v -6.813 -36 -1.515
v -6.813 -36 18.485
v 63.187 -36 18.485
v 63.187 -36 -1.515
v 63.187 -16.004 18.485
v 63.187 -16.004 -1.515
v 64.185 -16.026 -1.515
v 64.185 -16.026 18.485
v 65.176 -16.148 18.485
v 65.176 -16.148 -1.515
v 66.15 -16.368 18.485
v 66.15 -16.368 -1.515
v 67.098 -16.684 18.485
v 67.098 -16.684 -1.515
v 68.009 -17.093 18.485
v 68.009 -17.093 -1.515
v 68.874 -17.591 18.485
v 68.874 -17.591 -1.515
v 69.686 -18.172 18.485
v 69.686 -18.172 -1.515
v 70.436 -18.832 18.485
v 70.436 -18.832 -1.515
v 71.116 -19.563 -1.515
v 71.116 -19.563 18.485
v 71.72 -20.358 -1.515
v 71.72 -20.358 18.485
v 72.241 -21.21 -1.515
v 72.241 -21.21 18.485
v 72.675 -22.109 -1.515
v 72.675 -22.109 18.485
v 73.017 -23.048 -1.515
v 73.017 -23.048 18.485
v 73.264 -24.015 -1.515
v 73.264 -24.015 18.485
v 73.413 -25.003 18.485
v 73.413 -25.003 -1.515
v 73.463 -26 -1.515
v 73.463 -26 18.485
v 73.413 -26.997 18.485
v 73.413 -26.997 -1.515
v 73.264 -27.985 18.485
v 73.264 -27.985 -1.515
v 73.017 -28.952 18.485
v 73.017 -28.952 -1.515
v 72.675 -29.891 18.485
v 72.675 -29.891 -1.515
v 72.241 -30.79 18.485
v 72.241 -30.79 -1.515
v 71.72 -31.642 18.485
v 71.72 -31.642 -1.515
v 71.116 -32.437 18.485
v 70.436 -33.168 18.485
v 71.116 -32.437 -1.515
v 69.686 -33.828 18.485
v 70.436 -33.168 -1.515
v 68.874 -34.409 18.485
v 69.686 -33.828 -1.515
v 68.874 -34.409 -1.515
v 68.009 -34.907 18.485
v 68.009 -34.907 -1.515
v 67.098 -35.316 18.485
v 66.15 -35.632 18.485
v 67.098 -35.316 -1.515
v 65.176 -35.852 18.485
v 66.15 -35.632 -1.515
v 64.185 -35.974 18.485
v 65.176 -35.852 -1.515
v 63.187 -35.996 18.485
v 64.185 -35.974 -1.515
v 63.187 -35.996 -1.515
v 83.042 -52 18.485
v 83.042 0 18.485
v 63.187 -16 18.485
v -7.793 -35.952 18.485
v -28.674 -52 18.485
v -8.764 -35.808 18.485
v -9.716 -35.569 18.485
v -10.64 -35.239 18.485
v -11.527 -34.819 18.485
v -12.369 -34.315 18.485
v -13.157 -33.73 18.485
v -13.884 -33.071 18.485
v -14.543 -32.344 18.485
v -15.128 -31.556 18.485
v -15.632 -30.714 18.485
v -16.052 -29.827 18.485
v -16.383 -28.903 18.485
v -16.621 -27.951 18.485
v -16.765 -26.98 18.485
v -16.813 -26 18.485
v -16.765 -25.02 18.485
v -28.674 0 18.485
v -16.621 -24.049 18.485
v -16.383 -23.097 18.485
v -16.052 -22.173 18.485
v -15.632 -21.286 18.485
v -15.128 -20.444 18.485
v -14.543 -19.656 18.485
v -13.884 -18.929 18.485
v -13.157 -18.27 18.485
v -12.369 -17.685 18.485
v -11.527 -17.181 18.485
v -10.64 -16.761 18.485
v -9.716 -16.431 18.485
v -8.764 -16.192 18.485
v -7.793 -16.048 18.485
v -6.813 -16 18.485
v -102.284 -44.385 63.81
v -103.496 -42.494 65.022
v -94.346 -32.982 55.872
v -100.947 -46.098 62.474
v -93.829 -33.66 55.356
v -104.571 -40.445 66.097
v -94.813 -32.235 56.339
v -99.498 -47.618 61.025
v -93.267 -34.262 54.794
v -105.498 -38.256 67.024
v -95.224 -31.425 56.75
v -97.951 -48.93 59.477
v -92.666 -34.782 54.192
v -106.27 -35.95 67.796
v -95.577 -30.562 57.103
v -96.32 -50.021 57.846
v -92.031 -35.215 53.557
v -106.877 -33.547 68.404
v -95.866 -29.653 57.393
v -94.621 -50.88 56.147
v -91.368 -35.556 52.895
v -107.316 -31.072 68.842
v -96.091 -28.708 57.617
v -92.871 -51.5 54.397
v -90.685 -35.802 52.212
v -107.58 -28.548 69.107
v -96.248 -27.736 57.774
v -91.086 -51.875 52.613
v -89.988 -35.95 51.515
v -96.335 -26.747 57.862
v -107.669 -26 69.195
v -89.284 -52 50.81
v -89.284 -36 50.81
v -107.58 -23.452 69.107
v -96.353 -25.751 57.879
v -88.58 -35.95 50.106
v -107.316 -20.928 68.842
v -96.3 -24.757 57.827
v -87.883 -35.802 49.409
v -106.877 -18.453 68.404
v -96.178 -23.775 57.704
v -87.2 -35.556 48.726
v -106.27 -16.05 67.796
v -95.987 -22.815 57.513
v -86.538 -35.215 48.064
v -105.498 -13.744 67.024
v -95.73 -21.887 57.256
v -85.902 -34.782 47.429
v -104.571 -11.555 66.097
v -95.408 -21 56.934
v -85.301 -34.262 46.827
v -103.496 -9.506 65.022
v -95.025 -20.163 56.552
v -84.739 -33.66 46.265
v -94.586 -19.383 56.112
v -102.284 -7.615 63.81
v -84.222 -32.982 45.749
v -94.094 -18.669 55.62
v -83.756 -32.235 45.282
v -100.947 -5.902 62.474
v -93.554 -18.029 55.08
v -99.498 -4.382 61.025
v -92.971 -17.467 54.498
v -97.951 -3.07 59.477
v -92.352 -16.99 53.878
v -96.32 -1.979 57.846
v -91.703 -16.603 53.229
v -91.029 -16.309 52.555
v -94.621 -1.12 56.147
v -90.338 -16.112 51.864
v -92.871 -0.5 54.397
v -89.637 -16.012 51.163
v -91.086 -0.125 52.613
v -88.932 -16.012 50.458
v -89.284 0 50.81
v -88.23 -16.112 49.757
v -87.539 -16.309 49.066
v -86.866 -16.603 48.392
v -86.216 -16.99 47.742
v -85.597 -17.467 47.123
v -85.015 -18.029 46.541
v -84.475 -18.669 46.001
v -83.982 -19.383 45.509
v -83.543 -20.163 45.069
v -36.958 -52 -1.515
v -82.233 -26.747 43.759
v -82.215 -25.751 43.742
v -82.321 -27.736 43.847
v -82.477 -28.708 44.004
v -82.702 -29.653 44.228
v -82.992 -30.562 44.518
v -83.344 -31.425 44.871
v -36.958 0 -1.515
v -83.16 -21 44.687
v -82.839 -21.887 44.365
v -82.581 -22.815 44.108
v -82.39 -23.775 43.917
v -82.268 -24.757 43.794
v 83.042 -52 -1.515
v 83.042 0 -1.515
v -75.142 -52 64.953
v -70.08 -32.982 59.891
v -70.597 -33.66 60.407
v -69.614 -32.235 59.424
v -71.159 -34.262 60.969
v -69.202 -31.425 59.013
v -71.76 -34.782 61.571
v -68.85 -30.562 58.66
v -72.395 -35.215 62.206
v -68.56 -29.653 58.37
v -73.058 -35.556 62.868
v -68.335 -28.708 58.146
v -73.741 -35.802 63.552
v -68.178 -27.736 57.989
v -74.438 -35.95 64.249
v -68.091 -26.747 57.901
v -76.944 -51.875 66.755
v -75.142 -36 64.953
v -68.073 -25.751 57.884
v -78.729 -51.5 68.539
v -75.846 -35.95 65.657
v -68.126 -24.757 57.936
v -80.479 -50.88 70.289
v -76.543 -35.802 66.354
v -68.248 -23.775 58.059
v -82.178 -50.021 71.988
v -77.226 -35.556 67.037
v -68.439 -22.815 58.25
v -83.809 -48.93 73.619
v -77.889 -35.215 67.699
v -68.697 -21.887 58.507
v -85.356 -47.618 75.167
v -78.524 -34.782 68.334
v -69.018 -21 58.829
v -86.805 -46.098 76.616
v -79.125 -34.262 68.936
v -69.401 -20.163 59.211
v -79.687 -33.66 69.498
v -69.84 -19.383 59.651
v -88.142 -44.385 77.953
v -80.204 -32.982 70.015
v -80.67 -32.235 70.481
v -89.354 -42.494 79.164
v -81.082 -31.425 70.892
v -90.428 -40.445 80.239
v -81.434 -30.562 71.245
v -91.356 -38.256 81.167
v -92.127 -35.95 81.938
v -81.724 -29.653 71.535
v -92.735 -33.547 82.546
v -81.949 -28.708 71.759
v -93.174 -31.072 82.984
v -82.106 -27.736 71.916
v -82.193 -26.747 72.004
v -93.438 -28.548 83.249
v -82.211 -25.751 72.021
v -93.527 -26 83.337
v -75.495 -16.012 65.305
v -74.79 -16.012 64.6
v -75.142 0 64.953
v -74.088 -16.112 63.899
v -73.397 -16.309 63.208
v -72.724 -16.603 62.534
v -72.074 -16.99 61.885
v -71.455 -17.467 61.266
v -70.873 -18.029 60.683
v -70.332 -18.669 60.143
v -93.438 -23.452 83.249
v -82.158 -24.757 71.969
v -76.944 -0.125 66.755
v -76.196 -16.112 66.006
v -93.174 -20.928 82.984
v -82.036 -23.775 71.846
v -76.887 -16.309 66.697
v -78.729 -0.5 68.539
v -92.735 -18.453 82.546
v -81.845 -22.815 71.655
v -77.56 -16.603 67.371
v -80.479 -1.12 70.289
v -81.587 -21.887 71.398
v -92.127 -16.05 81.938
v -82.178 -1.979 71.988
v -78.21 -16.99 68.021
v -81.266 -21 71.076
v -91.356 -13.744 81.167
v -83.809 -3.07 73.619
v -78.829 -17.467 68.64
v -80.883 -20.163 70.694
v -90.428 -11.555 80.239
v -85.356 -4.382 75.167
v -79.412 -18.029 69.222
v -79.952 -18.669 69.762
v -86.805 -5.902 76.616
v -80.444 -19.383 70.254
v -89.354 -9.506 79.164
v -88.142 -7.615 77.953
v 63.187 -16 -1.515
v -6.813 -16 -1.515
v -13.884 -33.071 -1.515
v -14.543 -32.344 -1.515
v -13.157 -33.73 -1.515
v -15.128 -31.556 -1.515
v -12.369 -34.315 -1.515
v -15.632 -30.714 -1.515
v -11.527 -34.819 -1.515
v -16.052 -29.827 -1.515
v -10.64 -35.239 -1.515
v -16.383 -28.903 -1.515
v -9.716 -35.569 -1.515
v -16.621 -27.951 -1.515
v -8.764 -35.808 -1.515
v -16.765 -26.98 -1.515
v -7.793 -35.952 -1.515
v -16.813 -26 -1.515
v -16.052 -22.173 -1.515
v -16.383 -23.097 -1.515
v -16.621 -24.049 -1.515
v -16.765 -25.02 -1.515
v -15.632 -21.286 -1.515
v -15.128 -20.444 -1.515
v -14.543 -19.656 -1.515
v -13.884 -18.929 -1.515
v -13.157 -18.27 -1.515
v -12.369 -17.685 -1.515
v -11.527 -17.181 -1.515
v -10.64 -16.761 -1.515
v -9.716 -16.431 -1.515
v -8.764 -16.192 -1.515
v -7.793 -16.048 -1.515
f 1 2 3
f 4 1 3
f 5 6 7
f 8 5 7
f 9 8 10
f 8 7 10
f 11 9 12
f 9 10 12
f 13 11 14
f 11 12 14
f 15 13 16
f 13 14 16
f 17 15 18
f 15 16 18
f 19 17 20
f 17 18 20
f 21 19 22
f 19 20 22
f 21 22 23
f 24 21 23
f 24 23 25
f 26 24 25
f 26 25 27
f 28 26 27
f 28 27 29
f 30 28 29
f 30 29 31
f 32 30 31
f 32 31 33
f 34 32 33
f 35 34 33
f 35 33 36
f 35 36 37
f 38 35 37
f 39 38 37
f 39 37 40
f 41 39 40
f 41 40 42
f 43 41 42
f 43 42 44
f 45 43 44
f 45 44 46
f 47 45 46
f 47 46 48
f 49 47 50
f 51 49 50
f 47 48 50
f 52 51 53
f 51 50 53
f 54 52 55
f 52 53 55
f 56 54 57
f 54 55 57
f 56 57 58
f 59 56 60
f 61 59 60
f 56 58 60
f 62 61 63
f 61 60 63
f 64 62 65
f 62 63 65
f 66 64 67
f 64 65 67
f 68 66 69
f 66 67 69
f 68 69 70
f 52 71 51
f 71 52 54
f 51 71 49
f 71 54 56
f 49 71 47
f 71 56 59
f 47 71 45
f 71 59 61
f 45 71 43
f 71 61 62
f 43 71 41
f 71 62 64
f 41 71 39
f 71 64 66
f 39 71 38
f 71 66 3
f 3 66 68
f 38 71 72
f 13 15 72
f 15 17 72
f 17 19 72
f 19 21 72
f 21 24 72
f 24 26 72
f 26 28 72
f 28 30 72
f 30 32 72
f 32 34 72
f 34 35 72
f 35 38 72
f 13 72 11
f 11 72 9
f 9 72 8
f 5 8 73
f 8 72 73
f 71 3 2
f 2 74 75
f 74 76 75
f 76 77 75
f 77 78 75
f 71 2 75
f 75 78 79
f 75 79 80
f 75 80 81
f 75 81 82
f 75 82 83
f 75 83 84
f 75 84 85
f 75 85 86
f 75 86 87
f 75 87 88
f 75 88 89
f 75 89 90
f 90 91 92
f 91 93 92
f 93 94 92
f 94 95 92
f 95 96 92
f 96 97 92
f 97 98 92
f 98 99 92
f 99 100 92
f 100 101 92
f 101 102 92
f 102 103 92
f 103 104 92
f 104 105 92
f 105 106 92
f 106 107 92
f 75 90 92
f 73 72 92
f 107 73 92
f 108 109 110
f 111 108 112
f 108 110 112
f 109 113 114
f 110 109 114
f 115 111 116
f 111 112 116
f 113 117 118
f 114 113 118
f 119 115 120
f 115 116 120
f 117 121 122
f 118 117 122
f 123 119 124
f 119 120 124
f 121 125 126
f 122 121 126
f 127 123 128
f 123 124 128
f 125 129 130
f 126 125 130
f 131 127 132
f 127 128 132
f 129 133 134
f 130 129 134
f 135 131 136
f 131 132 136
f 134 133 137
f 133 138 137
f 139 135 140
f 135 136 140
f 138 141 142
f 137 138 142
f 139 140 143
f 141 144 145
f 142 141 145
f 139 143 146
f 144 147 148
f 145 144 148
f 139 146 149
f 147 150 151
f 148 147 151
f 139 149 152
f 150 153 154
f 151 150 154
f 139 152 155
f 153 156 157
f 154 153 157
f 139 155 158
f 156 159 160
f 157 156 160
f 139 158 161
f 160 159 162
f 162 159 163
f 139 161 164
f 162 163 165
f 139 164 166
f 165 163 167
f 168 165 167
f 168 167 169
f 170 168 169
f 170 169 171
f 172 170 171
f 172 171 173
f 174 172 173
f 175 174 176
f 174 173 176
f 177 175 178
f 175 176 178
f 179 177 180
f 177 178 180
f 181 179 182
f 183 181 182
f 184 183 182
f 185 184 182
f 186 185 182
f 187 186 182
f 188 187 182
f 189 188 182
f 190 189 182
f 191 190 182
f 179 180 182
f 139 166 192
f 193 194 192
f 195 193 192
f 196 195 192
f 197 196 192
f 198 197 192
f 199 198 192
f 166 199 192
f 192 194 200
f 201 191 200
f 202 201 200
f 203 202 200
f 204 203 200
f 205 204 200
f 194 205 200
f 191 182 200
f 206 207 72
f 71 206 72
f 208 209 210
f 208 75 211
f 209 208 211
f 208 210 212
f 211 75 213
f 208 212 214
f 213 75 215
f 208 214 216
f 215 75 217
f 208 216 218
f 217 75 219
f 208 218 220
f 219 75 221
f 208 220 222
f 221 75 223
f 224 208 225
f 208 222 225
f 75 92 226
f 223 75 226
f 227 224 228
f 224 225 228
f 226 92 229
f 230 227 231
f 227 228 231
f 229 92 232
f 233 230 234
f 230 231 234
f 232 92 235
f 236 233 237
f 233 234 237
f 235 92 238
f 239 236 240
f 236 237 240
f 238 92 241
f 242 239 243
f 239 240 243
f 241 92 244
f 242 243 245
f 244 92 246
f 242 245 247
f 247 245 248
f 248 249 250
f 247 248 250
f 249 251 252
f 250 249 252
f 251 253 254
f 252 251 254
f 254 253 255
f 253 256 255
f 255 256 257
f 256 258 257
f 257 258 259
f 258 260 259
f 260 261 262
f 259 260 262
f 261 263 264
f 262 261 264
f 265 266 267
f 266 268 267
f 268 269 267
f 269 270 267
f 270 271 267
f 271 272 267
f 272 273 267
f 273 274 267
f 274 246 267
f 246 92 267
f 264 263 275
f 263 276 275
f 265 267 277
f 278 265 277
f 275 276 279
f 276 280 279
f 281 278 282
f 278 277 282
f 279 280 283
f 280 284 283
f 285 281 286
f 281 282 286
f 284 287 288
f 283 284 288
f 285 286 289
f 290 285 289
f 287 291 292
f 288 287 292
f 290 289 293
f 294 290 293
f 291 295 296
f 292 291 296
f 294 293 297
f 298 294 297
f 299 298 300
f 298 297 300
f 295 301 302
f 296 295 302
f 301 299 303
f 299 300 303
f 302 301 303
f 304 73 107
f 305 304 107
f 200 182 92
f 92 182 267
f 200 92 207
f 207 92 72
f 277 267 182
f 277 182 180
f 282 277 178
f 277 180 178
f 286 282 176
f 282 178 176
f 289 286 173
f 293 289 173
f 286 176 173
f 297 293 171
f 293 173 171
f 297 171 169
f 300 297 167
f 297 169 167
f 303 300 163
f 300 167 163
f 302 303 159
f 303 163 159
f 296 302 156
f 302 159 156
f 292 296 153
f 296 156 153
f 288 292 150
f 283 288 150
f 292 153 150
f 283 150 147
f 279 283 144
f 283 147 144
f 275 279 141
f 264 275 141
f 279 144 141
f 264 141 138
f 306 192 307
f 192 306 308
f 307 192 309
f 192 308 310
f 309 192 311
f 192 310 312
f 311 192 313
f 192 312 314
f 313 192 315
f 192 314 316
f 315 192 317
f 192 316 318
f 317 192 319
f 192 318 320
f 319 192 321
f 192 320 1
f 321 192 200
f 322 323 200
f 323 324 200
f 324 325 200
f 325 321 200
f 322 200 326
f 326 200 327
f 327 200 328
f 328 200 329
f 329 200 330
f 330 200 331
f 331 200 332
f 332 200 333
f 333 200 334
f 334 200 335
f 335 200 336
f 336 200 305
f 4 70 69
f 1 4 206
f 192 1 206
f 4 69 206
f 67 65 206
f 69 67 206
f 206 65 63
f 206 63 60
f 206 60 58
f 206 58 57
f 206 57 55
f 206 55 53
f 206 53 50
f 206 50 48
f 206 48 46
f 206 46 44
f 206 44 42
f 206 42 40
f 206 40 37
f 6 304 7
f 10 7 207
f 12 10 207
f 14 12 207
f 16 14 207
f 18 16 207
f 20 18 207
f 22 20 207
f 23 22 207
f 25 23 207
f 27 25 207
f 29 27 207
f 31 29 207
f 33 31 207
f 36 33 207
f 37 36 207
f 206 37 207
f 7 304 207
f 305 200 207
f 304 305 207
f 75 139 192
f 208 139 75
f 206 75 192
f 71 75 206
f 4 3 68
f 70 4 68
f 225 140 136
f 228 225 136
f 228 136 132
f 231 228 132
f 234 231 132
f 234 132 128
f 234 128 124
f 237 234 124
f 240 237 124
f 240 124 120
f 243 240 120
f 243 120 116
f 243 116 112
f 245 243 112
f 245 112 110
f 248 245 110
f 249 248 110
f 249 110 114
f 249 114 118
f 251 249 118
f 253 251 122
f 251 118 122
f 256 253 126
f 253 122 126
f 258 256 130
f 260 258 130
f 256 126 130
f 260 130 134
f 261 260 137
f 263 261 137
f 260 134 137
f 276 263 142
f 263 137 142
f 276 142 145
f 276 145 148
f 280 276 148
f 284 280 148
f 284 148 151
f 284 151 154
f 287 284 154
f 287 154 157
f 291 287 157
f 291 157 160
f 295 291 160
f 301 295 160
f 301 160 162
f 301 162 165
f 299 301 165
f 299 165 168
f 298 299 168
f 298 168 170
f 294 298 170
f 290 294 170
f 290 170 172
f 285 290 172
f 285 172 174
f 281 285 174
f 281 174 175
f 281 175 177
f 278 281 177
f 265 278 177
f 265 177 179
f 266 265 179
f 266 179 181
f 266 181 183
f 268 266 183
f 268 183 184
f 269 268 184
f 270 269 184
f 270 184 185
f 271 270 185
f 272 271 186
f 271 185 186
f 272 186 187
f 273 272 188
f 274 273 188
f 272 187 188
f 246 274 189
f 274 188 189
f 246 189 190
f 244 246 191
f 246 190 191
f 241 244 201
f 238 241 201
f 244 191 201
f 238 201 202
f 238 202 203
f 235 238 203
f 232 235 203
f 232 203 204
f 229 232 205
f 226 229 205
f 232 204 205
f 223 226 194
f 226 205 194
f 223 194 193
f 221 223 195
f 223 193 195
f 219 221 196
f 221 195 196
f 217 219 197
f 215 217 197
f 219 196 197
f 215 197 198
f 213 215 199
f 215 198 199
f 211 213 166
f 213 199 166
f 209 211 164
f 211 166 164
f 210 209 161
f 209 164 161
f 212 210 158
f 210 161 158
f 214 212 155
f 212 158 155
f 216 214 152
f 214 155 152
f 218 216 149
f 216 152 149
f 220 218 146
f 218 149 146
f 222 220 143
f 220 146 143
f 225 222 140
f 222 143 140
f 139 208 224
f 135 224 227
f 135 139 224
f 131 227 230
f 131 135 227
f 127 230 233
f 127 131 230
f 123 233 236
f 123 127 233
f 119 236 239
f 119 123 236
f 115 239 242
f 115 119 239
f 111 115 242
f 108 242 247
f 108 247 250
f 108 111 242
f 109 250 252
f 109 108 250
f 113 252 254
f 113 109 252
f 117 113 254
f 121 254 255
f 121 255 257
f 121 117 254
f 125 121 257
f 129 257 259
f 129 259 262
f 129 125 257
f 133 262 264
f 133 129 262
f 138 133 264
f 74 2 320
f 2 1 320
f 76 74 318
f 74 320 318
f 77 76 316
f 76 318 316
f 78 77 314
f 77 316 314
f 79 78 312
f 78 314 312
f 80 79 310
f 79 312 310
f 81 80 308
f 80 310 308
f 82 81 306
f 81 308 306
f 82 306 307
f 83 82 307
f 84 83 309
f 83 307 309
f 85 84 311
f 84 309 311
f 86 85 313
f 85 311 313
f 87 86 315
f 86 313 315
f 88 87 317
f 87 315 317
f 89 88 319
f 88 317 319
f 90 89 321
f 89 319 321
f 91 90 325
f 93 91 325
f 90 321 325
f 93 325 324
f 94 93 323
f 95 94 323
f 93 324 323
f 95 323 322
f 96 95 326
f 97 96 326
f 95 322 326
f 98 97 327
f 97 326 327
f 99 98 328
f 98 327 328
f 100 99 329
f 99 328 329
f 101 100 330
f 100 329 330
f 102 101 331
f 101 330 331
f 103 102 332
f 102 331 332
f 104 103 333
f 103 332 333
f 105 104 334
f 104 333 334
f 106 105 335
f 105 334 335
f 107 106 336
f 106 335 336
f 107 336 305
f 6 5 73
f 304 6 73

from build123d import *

# Parameters (mm, degrees)
F0_W     = 90
F0_H     = 20
F0_W_2   = 10
F1_DEPTH = 52
F3_D     = 20
F5_D     = 20
F6_R     = 25.99999
F7_DEPTH = 312


# Not quite as in the source:
# - a fillet or chamfer is up to 0.001 mm smaller than in the source, because OpenCascade refuses the exact size


with BuildPart() as f1:
    # F0 (on Front) → F1 (new body)
    with BuildSketch(Plane.XZ):
        Polygon((-16.9582804857, -1.5154299321), (-16.9582804857, 18.4845700679), (-28.6740092382, 18.4845700679), (-68.0709788579, 57.8815396876), (-82.2131144816, 72.0236753113), (-93.5268229806, 83.3373838103), (-107.6689586043, 69.1952481866), (-36.9582804857, -1.5154299321), align=None)
        with Locations((28.0417195143, 8.4845700679)):
            Rectangle(F0_W, F0_H)
        with Locations((78.0417195143, 8.4845700679)):
            Rectangle(F0_W_2, F0_H)
    extrude(amount=F1_DEPTH)

    # F3 (through all)
    with Locations(Plane.XY.offset(18.4845700679)):
        with Locations((63.4629929066, -26), (-6.8132670224, -26)):
            Hole(F3_D / 2)

    # F5 (through all)
    with Locations(Plane(origin=(-5.0947195851, 0, -5.0947195851), x_dir=(0, 1, 0), z_dir=(0.7071067812, 0, 0.7071067812))):
        with Locations((-26, 99.061879971)):
            Hole(F5_D / 2)

    # F6 (radius 26 in the source; OpenCascade refuses exactly that, so slightly less here)
    f6_edges = [f1.edges().sort_by_distance(p)[0] for p in [
        (-100.597891, 0, 76.266316),
        (-100.597891, -52, 76.266316),
    ]]
    fillet(f6_edges, radius=F6_R)

    # F2 (on face) → F7 (cut)
    with BuildSketch(Plane.XY.offset(18.4845700679)):
        Polygon((63.1867329776, -36), (63.1867329776, -26), (52.6720061898, -26), (0, -26), (-5.5663499609, -26), (-6.8132670224, -26), (-6.8132670224, -36), align=None)
        Polygon((52.6720061898, -26), (63.1867329776, -26), (63.1867329776, -16), (-6.8132670224, -16), (-6.8132670224, -26), (-5.5663499609, -26), (0, -26), align=None)
    extrude(amount=-F7_DEPTH, mode=Mode.SUBTRACT)


solid = f1.part
